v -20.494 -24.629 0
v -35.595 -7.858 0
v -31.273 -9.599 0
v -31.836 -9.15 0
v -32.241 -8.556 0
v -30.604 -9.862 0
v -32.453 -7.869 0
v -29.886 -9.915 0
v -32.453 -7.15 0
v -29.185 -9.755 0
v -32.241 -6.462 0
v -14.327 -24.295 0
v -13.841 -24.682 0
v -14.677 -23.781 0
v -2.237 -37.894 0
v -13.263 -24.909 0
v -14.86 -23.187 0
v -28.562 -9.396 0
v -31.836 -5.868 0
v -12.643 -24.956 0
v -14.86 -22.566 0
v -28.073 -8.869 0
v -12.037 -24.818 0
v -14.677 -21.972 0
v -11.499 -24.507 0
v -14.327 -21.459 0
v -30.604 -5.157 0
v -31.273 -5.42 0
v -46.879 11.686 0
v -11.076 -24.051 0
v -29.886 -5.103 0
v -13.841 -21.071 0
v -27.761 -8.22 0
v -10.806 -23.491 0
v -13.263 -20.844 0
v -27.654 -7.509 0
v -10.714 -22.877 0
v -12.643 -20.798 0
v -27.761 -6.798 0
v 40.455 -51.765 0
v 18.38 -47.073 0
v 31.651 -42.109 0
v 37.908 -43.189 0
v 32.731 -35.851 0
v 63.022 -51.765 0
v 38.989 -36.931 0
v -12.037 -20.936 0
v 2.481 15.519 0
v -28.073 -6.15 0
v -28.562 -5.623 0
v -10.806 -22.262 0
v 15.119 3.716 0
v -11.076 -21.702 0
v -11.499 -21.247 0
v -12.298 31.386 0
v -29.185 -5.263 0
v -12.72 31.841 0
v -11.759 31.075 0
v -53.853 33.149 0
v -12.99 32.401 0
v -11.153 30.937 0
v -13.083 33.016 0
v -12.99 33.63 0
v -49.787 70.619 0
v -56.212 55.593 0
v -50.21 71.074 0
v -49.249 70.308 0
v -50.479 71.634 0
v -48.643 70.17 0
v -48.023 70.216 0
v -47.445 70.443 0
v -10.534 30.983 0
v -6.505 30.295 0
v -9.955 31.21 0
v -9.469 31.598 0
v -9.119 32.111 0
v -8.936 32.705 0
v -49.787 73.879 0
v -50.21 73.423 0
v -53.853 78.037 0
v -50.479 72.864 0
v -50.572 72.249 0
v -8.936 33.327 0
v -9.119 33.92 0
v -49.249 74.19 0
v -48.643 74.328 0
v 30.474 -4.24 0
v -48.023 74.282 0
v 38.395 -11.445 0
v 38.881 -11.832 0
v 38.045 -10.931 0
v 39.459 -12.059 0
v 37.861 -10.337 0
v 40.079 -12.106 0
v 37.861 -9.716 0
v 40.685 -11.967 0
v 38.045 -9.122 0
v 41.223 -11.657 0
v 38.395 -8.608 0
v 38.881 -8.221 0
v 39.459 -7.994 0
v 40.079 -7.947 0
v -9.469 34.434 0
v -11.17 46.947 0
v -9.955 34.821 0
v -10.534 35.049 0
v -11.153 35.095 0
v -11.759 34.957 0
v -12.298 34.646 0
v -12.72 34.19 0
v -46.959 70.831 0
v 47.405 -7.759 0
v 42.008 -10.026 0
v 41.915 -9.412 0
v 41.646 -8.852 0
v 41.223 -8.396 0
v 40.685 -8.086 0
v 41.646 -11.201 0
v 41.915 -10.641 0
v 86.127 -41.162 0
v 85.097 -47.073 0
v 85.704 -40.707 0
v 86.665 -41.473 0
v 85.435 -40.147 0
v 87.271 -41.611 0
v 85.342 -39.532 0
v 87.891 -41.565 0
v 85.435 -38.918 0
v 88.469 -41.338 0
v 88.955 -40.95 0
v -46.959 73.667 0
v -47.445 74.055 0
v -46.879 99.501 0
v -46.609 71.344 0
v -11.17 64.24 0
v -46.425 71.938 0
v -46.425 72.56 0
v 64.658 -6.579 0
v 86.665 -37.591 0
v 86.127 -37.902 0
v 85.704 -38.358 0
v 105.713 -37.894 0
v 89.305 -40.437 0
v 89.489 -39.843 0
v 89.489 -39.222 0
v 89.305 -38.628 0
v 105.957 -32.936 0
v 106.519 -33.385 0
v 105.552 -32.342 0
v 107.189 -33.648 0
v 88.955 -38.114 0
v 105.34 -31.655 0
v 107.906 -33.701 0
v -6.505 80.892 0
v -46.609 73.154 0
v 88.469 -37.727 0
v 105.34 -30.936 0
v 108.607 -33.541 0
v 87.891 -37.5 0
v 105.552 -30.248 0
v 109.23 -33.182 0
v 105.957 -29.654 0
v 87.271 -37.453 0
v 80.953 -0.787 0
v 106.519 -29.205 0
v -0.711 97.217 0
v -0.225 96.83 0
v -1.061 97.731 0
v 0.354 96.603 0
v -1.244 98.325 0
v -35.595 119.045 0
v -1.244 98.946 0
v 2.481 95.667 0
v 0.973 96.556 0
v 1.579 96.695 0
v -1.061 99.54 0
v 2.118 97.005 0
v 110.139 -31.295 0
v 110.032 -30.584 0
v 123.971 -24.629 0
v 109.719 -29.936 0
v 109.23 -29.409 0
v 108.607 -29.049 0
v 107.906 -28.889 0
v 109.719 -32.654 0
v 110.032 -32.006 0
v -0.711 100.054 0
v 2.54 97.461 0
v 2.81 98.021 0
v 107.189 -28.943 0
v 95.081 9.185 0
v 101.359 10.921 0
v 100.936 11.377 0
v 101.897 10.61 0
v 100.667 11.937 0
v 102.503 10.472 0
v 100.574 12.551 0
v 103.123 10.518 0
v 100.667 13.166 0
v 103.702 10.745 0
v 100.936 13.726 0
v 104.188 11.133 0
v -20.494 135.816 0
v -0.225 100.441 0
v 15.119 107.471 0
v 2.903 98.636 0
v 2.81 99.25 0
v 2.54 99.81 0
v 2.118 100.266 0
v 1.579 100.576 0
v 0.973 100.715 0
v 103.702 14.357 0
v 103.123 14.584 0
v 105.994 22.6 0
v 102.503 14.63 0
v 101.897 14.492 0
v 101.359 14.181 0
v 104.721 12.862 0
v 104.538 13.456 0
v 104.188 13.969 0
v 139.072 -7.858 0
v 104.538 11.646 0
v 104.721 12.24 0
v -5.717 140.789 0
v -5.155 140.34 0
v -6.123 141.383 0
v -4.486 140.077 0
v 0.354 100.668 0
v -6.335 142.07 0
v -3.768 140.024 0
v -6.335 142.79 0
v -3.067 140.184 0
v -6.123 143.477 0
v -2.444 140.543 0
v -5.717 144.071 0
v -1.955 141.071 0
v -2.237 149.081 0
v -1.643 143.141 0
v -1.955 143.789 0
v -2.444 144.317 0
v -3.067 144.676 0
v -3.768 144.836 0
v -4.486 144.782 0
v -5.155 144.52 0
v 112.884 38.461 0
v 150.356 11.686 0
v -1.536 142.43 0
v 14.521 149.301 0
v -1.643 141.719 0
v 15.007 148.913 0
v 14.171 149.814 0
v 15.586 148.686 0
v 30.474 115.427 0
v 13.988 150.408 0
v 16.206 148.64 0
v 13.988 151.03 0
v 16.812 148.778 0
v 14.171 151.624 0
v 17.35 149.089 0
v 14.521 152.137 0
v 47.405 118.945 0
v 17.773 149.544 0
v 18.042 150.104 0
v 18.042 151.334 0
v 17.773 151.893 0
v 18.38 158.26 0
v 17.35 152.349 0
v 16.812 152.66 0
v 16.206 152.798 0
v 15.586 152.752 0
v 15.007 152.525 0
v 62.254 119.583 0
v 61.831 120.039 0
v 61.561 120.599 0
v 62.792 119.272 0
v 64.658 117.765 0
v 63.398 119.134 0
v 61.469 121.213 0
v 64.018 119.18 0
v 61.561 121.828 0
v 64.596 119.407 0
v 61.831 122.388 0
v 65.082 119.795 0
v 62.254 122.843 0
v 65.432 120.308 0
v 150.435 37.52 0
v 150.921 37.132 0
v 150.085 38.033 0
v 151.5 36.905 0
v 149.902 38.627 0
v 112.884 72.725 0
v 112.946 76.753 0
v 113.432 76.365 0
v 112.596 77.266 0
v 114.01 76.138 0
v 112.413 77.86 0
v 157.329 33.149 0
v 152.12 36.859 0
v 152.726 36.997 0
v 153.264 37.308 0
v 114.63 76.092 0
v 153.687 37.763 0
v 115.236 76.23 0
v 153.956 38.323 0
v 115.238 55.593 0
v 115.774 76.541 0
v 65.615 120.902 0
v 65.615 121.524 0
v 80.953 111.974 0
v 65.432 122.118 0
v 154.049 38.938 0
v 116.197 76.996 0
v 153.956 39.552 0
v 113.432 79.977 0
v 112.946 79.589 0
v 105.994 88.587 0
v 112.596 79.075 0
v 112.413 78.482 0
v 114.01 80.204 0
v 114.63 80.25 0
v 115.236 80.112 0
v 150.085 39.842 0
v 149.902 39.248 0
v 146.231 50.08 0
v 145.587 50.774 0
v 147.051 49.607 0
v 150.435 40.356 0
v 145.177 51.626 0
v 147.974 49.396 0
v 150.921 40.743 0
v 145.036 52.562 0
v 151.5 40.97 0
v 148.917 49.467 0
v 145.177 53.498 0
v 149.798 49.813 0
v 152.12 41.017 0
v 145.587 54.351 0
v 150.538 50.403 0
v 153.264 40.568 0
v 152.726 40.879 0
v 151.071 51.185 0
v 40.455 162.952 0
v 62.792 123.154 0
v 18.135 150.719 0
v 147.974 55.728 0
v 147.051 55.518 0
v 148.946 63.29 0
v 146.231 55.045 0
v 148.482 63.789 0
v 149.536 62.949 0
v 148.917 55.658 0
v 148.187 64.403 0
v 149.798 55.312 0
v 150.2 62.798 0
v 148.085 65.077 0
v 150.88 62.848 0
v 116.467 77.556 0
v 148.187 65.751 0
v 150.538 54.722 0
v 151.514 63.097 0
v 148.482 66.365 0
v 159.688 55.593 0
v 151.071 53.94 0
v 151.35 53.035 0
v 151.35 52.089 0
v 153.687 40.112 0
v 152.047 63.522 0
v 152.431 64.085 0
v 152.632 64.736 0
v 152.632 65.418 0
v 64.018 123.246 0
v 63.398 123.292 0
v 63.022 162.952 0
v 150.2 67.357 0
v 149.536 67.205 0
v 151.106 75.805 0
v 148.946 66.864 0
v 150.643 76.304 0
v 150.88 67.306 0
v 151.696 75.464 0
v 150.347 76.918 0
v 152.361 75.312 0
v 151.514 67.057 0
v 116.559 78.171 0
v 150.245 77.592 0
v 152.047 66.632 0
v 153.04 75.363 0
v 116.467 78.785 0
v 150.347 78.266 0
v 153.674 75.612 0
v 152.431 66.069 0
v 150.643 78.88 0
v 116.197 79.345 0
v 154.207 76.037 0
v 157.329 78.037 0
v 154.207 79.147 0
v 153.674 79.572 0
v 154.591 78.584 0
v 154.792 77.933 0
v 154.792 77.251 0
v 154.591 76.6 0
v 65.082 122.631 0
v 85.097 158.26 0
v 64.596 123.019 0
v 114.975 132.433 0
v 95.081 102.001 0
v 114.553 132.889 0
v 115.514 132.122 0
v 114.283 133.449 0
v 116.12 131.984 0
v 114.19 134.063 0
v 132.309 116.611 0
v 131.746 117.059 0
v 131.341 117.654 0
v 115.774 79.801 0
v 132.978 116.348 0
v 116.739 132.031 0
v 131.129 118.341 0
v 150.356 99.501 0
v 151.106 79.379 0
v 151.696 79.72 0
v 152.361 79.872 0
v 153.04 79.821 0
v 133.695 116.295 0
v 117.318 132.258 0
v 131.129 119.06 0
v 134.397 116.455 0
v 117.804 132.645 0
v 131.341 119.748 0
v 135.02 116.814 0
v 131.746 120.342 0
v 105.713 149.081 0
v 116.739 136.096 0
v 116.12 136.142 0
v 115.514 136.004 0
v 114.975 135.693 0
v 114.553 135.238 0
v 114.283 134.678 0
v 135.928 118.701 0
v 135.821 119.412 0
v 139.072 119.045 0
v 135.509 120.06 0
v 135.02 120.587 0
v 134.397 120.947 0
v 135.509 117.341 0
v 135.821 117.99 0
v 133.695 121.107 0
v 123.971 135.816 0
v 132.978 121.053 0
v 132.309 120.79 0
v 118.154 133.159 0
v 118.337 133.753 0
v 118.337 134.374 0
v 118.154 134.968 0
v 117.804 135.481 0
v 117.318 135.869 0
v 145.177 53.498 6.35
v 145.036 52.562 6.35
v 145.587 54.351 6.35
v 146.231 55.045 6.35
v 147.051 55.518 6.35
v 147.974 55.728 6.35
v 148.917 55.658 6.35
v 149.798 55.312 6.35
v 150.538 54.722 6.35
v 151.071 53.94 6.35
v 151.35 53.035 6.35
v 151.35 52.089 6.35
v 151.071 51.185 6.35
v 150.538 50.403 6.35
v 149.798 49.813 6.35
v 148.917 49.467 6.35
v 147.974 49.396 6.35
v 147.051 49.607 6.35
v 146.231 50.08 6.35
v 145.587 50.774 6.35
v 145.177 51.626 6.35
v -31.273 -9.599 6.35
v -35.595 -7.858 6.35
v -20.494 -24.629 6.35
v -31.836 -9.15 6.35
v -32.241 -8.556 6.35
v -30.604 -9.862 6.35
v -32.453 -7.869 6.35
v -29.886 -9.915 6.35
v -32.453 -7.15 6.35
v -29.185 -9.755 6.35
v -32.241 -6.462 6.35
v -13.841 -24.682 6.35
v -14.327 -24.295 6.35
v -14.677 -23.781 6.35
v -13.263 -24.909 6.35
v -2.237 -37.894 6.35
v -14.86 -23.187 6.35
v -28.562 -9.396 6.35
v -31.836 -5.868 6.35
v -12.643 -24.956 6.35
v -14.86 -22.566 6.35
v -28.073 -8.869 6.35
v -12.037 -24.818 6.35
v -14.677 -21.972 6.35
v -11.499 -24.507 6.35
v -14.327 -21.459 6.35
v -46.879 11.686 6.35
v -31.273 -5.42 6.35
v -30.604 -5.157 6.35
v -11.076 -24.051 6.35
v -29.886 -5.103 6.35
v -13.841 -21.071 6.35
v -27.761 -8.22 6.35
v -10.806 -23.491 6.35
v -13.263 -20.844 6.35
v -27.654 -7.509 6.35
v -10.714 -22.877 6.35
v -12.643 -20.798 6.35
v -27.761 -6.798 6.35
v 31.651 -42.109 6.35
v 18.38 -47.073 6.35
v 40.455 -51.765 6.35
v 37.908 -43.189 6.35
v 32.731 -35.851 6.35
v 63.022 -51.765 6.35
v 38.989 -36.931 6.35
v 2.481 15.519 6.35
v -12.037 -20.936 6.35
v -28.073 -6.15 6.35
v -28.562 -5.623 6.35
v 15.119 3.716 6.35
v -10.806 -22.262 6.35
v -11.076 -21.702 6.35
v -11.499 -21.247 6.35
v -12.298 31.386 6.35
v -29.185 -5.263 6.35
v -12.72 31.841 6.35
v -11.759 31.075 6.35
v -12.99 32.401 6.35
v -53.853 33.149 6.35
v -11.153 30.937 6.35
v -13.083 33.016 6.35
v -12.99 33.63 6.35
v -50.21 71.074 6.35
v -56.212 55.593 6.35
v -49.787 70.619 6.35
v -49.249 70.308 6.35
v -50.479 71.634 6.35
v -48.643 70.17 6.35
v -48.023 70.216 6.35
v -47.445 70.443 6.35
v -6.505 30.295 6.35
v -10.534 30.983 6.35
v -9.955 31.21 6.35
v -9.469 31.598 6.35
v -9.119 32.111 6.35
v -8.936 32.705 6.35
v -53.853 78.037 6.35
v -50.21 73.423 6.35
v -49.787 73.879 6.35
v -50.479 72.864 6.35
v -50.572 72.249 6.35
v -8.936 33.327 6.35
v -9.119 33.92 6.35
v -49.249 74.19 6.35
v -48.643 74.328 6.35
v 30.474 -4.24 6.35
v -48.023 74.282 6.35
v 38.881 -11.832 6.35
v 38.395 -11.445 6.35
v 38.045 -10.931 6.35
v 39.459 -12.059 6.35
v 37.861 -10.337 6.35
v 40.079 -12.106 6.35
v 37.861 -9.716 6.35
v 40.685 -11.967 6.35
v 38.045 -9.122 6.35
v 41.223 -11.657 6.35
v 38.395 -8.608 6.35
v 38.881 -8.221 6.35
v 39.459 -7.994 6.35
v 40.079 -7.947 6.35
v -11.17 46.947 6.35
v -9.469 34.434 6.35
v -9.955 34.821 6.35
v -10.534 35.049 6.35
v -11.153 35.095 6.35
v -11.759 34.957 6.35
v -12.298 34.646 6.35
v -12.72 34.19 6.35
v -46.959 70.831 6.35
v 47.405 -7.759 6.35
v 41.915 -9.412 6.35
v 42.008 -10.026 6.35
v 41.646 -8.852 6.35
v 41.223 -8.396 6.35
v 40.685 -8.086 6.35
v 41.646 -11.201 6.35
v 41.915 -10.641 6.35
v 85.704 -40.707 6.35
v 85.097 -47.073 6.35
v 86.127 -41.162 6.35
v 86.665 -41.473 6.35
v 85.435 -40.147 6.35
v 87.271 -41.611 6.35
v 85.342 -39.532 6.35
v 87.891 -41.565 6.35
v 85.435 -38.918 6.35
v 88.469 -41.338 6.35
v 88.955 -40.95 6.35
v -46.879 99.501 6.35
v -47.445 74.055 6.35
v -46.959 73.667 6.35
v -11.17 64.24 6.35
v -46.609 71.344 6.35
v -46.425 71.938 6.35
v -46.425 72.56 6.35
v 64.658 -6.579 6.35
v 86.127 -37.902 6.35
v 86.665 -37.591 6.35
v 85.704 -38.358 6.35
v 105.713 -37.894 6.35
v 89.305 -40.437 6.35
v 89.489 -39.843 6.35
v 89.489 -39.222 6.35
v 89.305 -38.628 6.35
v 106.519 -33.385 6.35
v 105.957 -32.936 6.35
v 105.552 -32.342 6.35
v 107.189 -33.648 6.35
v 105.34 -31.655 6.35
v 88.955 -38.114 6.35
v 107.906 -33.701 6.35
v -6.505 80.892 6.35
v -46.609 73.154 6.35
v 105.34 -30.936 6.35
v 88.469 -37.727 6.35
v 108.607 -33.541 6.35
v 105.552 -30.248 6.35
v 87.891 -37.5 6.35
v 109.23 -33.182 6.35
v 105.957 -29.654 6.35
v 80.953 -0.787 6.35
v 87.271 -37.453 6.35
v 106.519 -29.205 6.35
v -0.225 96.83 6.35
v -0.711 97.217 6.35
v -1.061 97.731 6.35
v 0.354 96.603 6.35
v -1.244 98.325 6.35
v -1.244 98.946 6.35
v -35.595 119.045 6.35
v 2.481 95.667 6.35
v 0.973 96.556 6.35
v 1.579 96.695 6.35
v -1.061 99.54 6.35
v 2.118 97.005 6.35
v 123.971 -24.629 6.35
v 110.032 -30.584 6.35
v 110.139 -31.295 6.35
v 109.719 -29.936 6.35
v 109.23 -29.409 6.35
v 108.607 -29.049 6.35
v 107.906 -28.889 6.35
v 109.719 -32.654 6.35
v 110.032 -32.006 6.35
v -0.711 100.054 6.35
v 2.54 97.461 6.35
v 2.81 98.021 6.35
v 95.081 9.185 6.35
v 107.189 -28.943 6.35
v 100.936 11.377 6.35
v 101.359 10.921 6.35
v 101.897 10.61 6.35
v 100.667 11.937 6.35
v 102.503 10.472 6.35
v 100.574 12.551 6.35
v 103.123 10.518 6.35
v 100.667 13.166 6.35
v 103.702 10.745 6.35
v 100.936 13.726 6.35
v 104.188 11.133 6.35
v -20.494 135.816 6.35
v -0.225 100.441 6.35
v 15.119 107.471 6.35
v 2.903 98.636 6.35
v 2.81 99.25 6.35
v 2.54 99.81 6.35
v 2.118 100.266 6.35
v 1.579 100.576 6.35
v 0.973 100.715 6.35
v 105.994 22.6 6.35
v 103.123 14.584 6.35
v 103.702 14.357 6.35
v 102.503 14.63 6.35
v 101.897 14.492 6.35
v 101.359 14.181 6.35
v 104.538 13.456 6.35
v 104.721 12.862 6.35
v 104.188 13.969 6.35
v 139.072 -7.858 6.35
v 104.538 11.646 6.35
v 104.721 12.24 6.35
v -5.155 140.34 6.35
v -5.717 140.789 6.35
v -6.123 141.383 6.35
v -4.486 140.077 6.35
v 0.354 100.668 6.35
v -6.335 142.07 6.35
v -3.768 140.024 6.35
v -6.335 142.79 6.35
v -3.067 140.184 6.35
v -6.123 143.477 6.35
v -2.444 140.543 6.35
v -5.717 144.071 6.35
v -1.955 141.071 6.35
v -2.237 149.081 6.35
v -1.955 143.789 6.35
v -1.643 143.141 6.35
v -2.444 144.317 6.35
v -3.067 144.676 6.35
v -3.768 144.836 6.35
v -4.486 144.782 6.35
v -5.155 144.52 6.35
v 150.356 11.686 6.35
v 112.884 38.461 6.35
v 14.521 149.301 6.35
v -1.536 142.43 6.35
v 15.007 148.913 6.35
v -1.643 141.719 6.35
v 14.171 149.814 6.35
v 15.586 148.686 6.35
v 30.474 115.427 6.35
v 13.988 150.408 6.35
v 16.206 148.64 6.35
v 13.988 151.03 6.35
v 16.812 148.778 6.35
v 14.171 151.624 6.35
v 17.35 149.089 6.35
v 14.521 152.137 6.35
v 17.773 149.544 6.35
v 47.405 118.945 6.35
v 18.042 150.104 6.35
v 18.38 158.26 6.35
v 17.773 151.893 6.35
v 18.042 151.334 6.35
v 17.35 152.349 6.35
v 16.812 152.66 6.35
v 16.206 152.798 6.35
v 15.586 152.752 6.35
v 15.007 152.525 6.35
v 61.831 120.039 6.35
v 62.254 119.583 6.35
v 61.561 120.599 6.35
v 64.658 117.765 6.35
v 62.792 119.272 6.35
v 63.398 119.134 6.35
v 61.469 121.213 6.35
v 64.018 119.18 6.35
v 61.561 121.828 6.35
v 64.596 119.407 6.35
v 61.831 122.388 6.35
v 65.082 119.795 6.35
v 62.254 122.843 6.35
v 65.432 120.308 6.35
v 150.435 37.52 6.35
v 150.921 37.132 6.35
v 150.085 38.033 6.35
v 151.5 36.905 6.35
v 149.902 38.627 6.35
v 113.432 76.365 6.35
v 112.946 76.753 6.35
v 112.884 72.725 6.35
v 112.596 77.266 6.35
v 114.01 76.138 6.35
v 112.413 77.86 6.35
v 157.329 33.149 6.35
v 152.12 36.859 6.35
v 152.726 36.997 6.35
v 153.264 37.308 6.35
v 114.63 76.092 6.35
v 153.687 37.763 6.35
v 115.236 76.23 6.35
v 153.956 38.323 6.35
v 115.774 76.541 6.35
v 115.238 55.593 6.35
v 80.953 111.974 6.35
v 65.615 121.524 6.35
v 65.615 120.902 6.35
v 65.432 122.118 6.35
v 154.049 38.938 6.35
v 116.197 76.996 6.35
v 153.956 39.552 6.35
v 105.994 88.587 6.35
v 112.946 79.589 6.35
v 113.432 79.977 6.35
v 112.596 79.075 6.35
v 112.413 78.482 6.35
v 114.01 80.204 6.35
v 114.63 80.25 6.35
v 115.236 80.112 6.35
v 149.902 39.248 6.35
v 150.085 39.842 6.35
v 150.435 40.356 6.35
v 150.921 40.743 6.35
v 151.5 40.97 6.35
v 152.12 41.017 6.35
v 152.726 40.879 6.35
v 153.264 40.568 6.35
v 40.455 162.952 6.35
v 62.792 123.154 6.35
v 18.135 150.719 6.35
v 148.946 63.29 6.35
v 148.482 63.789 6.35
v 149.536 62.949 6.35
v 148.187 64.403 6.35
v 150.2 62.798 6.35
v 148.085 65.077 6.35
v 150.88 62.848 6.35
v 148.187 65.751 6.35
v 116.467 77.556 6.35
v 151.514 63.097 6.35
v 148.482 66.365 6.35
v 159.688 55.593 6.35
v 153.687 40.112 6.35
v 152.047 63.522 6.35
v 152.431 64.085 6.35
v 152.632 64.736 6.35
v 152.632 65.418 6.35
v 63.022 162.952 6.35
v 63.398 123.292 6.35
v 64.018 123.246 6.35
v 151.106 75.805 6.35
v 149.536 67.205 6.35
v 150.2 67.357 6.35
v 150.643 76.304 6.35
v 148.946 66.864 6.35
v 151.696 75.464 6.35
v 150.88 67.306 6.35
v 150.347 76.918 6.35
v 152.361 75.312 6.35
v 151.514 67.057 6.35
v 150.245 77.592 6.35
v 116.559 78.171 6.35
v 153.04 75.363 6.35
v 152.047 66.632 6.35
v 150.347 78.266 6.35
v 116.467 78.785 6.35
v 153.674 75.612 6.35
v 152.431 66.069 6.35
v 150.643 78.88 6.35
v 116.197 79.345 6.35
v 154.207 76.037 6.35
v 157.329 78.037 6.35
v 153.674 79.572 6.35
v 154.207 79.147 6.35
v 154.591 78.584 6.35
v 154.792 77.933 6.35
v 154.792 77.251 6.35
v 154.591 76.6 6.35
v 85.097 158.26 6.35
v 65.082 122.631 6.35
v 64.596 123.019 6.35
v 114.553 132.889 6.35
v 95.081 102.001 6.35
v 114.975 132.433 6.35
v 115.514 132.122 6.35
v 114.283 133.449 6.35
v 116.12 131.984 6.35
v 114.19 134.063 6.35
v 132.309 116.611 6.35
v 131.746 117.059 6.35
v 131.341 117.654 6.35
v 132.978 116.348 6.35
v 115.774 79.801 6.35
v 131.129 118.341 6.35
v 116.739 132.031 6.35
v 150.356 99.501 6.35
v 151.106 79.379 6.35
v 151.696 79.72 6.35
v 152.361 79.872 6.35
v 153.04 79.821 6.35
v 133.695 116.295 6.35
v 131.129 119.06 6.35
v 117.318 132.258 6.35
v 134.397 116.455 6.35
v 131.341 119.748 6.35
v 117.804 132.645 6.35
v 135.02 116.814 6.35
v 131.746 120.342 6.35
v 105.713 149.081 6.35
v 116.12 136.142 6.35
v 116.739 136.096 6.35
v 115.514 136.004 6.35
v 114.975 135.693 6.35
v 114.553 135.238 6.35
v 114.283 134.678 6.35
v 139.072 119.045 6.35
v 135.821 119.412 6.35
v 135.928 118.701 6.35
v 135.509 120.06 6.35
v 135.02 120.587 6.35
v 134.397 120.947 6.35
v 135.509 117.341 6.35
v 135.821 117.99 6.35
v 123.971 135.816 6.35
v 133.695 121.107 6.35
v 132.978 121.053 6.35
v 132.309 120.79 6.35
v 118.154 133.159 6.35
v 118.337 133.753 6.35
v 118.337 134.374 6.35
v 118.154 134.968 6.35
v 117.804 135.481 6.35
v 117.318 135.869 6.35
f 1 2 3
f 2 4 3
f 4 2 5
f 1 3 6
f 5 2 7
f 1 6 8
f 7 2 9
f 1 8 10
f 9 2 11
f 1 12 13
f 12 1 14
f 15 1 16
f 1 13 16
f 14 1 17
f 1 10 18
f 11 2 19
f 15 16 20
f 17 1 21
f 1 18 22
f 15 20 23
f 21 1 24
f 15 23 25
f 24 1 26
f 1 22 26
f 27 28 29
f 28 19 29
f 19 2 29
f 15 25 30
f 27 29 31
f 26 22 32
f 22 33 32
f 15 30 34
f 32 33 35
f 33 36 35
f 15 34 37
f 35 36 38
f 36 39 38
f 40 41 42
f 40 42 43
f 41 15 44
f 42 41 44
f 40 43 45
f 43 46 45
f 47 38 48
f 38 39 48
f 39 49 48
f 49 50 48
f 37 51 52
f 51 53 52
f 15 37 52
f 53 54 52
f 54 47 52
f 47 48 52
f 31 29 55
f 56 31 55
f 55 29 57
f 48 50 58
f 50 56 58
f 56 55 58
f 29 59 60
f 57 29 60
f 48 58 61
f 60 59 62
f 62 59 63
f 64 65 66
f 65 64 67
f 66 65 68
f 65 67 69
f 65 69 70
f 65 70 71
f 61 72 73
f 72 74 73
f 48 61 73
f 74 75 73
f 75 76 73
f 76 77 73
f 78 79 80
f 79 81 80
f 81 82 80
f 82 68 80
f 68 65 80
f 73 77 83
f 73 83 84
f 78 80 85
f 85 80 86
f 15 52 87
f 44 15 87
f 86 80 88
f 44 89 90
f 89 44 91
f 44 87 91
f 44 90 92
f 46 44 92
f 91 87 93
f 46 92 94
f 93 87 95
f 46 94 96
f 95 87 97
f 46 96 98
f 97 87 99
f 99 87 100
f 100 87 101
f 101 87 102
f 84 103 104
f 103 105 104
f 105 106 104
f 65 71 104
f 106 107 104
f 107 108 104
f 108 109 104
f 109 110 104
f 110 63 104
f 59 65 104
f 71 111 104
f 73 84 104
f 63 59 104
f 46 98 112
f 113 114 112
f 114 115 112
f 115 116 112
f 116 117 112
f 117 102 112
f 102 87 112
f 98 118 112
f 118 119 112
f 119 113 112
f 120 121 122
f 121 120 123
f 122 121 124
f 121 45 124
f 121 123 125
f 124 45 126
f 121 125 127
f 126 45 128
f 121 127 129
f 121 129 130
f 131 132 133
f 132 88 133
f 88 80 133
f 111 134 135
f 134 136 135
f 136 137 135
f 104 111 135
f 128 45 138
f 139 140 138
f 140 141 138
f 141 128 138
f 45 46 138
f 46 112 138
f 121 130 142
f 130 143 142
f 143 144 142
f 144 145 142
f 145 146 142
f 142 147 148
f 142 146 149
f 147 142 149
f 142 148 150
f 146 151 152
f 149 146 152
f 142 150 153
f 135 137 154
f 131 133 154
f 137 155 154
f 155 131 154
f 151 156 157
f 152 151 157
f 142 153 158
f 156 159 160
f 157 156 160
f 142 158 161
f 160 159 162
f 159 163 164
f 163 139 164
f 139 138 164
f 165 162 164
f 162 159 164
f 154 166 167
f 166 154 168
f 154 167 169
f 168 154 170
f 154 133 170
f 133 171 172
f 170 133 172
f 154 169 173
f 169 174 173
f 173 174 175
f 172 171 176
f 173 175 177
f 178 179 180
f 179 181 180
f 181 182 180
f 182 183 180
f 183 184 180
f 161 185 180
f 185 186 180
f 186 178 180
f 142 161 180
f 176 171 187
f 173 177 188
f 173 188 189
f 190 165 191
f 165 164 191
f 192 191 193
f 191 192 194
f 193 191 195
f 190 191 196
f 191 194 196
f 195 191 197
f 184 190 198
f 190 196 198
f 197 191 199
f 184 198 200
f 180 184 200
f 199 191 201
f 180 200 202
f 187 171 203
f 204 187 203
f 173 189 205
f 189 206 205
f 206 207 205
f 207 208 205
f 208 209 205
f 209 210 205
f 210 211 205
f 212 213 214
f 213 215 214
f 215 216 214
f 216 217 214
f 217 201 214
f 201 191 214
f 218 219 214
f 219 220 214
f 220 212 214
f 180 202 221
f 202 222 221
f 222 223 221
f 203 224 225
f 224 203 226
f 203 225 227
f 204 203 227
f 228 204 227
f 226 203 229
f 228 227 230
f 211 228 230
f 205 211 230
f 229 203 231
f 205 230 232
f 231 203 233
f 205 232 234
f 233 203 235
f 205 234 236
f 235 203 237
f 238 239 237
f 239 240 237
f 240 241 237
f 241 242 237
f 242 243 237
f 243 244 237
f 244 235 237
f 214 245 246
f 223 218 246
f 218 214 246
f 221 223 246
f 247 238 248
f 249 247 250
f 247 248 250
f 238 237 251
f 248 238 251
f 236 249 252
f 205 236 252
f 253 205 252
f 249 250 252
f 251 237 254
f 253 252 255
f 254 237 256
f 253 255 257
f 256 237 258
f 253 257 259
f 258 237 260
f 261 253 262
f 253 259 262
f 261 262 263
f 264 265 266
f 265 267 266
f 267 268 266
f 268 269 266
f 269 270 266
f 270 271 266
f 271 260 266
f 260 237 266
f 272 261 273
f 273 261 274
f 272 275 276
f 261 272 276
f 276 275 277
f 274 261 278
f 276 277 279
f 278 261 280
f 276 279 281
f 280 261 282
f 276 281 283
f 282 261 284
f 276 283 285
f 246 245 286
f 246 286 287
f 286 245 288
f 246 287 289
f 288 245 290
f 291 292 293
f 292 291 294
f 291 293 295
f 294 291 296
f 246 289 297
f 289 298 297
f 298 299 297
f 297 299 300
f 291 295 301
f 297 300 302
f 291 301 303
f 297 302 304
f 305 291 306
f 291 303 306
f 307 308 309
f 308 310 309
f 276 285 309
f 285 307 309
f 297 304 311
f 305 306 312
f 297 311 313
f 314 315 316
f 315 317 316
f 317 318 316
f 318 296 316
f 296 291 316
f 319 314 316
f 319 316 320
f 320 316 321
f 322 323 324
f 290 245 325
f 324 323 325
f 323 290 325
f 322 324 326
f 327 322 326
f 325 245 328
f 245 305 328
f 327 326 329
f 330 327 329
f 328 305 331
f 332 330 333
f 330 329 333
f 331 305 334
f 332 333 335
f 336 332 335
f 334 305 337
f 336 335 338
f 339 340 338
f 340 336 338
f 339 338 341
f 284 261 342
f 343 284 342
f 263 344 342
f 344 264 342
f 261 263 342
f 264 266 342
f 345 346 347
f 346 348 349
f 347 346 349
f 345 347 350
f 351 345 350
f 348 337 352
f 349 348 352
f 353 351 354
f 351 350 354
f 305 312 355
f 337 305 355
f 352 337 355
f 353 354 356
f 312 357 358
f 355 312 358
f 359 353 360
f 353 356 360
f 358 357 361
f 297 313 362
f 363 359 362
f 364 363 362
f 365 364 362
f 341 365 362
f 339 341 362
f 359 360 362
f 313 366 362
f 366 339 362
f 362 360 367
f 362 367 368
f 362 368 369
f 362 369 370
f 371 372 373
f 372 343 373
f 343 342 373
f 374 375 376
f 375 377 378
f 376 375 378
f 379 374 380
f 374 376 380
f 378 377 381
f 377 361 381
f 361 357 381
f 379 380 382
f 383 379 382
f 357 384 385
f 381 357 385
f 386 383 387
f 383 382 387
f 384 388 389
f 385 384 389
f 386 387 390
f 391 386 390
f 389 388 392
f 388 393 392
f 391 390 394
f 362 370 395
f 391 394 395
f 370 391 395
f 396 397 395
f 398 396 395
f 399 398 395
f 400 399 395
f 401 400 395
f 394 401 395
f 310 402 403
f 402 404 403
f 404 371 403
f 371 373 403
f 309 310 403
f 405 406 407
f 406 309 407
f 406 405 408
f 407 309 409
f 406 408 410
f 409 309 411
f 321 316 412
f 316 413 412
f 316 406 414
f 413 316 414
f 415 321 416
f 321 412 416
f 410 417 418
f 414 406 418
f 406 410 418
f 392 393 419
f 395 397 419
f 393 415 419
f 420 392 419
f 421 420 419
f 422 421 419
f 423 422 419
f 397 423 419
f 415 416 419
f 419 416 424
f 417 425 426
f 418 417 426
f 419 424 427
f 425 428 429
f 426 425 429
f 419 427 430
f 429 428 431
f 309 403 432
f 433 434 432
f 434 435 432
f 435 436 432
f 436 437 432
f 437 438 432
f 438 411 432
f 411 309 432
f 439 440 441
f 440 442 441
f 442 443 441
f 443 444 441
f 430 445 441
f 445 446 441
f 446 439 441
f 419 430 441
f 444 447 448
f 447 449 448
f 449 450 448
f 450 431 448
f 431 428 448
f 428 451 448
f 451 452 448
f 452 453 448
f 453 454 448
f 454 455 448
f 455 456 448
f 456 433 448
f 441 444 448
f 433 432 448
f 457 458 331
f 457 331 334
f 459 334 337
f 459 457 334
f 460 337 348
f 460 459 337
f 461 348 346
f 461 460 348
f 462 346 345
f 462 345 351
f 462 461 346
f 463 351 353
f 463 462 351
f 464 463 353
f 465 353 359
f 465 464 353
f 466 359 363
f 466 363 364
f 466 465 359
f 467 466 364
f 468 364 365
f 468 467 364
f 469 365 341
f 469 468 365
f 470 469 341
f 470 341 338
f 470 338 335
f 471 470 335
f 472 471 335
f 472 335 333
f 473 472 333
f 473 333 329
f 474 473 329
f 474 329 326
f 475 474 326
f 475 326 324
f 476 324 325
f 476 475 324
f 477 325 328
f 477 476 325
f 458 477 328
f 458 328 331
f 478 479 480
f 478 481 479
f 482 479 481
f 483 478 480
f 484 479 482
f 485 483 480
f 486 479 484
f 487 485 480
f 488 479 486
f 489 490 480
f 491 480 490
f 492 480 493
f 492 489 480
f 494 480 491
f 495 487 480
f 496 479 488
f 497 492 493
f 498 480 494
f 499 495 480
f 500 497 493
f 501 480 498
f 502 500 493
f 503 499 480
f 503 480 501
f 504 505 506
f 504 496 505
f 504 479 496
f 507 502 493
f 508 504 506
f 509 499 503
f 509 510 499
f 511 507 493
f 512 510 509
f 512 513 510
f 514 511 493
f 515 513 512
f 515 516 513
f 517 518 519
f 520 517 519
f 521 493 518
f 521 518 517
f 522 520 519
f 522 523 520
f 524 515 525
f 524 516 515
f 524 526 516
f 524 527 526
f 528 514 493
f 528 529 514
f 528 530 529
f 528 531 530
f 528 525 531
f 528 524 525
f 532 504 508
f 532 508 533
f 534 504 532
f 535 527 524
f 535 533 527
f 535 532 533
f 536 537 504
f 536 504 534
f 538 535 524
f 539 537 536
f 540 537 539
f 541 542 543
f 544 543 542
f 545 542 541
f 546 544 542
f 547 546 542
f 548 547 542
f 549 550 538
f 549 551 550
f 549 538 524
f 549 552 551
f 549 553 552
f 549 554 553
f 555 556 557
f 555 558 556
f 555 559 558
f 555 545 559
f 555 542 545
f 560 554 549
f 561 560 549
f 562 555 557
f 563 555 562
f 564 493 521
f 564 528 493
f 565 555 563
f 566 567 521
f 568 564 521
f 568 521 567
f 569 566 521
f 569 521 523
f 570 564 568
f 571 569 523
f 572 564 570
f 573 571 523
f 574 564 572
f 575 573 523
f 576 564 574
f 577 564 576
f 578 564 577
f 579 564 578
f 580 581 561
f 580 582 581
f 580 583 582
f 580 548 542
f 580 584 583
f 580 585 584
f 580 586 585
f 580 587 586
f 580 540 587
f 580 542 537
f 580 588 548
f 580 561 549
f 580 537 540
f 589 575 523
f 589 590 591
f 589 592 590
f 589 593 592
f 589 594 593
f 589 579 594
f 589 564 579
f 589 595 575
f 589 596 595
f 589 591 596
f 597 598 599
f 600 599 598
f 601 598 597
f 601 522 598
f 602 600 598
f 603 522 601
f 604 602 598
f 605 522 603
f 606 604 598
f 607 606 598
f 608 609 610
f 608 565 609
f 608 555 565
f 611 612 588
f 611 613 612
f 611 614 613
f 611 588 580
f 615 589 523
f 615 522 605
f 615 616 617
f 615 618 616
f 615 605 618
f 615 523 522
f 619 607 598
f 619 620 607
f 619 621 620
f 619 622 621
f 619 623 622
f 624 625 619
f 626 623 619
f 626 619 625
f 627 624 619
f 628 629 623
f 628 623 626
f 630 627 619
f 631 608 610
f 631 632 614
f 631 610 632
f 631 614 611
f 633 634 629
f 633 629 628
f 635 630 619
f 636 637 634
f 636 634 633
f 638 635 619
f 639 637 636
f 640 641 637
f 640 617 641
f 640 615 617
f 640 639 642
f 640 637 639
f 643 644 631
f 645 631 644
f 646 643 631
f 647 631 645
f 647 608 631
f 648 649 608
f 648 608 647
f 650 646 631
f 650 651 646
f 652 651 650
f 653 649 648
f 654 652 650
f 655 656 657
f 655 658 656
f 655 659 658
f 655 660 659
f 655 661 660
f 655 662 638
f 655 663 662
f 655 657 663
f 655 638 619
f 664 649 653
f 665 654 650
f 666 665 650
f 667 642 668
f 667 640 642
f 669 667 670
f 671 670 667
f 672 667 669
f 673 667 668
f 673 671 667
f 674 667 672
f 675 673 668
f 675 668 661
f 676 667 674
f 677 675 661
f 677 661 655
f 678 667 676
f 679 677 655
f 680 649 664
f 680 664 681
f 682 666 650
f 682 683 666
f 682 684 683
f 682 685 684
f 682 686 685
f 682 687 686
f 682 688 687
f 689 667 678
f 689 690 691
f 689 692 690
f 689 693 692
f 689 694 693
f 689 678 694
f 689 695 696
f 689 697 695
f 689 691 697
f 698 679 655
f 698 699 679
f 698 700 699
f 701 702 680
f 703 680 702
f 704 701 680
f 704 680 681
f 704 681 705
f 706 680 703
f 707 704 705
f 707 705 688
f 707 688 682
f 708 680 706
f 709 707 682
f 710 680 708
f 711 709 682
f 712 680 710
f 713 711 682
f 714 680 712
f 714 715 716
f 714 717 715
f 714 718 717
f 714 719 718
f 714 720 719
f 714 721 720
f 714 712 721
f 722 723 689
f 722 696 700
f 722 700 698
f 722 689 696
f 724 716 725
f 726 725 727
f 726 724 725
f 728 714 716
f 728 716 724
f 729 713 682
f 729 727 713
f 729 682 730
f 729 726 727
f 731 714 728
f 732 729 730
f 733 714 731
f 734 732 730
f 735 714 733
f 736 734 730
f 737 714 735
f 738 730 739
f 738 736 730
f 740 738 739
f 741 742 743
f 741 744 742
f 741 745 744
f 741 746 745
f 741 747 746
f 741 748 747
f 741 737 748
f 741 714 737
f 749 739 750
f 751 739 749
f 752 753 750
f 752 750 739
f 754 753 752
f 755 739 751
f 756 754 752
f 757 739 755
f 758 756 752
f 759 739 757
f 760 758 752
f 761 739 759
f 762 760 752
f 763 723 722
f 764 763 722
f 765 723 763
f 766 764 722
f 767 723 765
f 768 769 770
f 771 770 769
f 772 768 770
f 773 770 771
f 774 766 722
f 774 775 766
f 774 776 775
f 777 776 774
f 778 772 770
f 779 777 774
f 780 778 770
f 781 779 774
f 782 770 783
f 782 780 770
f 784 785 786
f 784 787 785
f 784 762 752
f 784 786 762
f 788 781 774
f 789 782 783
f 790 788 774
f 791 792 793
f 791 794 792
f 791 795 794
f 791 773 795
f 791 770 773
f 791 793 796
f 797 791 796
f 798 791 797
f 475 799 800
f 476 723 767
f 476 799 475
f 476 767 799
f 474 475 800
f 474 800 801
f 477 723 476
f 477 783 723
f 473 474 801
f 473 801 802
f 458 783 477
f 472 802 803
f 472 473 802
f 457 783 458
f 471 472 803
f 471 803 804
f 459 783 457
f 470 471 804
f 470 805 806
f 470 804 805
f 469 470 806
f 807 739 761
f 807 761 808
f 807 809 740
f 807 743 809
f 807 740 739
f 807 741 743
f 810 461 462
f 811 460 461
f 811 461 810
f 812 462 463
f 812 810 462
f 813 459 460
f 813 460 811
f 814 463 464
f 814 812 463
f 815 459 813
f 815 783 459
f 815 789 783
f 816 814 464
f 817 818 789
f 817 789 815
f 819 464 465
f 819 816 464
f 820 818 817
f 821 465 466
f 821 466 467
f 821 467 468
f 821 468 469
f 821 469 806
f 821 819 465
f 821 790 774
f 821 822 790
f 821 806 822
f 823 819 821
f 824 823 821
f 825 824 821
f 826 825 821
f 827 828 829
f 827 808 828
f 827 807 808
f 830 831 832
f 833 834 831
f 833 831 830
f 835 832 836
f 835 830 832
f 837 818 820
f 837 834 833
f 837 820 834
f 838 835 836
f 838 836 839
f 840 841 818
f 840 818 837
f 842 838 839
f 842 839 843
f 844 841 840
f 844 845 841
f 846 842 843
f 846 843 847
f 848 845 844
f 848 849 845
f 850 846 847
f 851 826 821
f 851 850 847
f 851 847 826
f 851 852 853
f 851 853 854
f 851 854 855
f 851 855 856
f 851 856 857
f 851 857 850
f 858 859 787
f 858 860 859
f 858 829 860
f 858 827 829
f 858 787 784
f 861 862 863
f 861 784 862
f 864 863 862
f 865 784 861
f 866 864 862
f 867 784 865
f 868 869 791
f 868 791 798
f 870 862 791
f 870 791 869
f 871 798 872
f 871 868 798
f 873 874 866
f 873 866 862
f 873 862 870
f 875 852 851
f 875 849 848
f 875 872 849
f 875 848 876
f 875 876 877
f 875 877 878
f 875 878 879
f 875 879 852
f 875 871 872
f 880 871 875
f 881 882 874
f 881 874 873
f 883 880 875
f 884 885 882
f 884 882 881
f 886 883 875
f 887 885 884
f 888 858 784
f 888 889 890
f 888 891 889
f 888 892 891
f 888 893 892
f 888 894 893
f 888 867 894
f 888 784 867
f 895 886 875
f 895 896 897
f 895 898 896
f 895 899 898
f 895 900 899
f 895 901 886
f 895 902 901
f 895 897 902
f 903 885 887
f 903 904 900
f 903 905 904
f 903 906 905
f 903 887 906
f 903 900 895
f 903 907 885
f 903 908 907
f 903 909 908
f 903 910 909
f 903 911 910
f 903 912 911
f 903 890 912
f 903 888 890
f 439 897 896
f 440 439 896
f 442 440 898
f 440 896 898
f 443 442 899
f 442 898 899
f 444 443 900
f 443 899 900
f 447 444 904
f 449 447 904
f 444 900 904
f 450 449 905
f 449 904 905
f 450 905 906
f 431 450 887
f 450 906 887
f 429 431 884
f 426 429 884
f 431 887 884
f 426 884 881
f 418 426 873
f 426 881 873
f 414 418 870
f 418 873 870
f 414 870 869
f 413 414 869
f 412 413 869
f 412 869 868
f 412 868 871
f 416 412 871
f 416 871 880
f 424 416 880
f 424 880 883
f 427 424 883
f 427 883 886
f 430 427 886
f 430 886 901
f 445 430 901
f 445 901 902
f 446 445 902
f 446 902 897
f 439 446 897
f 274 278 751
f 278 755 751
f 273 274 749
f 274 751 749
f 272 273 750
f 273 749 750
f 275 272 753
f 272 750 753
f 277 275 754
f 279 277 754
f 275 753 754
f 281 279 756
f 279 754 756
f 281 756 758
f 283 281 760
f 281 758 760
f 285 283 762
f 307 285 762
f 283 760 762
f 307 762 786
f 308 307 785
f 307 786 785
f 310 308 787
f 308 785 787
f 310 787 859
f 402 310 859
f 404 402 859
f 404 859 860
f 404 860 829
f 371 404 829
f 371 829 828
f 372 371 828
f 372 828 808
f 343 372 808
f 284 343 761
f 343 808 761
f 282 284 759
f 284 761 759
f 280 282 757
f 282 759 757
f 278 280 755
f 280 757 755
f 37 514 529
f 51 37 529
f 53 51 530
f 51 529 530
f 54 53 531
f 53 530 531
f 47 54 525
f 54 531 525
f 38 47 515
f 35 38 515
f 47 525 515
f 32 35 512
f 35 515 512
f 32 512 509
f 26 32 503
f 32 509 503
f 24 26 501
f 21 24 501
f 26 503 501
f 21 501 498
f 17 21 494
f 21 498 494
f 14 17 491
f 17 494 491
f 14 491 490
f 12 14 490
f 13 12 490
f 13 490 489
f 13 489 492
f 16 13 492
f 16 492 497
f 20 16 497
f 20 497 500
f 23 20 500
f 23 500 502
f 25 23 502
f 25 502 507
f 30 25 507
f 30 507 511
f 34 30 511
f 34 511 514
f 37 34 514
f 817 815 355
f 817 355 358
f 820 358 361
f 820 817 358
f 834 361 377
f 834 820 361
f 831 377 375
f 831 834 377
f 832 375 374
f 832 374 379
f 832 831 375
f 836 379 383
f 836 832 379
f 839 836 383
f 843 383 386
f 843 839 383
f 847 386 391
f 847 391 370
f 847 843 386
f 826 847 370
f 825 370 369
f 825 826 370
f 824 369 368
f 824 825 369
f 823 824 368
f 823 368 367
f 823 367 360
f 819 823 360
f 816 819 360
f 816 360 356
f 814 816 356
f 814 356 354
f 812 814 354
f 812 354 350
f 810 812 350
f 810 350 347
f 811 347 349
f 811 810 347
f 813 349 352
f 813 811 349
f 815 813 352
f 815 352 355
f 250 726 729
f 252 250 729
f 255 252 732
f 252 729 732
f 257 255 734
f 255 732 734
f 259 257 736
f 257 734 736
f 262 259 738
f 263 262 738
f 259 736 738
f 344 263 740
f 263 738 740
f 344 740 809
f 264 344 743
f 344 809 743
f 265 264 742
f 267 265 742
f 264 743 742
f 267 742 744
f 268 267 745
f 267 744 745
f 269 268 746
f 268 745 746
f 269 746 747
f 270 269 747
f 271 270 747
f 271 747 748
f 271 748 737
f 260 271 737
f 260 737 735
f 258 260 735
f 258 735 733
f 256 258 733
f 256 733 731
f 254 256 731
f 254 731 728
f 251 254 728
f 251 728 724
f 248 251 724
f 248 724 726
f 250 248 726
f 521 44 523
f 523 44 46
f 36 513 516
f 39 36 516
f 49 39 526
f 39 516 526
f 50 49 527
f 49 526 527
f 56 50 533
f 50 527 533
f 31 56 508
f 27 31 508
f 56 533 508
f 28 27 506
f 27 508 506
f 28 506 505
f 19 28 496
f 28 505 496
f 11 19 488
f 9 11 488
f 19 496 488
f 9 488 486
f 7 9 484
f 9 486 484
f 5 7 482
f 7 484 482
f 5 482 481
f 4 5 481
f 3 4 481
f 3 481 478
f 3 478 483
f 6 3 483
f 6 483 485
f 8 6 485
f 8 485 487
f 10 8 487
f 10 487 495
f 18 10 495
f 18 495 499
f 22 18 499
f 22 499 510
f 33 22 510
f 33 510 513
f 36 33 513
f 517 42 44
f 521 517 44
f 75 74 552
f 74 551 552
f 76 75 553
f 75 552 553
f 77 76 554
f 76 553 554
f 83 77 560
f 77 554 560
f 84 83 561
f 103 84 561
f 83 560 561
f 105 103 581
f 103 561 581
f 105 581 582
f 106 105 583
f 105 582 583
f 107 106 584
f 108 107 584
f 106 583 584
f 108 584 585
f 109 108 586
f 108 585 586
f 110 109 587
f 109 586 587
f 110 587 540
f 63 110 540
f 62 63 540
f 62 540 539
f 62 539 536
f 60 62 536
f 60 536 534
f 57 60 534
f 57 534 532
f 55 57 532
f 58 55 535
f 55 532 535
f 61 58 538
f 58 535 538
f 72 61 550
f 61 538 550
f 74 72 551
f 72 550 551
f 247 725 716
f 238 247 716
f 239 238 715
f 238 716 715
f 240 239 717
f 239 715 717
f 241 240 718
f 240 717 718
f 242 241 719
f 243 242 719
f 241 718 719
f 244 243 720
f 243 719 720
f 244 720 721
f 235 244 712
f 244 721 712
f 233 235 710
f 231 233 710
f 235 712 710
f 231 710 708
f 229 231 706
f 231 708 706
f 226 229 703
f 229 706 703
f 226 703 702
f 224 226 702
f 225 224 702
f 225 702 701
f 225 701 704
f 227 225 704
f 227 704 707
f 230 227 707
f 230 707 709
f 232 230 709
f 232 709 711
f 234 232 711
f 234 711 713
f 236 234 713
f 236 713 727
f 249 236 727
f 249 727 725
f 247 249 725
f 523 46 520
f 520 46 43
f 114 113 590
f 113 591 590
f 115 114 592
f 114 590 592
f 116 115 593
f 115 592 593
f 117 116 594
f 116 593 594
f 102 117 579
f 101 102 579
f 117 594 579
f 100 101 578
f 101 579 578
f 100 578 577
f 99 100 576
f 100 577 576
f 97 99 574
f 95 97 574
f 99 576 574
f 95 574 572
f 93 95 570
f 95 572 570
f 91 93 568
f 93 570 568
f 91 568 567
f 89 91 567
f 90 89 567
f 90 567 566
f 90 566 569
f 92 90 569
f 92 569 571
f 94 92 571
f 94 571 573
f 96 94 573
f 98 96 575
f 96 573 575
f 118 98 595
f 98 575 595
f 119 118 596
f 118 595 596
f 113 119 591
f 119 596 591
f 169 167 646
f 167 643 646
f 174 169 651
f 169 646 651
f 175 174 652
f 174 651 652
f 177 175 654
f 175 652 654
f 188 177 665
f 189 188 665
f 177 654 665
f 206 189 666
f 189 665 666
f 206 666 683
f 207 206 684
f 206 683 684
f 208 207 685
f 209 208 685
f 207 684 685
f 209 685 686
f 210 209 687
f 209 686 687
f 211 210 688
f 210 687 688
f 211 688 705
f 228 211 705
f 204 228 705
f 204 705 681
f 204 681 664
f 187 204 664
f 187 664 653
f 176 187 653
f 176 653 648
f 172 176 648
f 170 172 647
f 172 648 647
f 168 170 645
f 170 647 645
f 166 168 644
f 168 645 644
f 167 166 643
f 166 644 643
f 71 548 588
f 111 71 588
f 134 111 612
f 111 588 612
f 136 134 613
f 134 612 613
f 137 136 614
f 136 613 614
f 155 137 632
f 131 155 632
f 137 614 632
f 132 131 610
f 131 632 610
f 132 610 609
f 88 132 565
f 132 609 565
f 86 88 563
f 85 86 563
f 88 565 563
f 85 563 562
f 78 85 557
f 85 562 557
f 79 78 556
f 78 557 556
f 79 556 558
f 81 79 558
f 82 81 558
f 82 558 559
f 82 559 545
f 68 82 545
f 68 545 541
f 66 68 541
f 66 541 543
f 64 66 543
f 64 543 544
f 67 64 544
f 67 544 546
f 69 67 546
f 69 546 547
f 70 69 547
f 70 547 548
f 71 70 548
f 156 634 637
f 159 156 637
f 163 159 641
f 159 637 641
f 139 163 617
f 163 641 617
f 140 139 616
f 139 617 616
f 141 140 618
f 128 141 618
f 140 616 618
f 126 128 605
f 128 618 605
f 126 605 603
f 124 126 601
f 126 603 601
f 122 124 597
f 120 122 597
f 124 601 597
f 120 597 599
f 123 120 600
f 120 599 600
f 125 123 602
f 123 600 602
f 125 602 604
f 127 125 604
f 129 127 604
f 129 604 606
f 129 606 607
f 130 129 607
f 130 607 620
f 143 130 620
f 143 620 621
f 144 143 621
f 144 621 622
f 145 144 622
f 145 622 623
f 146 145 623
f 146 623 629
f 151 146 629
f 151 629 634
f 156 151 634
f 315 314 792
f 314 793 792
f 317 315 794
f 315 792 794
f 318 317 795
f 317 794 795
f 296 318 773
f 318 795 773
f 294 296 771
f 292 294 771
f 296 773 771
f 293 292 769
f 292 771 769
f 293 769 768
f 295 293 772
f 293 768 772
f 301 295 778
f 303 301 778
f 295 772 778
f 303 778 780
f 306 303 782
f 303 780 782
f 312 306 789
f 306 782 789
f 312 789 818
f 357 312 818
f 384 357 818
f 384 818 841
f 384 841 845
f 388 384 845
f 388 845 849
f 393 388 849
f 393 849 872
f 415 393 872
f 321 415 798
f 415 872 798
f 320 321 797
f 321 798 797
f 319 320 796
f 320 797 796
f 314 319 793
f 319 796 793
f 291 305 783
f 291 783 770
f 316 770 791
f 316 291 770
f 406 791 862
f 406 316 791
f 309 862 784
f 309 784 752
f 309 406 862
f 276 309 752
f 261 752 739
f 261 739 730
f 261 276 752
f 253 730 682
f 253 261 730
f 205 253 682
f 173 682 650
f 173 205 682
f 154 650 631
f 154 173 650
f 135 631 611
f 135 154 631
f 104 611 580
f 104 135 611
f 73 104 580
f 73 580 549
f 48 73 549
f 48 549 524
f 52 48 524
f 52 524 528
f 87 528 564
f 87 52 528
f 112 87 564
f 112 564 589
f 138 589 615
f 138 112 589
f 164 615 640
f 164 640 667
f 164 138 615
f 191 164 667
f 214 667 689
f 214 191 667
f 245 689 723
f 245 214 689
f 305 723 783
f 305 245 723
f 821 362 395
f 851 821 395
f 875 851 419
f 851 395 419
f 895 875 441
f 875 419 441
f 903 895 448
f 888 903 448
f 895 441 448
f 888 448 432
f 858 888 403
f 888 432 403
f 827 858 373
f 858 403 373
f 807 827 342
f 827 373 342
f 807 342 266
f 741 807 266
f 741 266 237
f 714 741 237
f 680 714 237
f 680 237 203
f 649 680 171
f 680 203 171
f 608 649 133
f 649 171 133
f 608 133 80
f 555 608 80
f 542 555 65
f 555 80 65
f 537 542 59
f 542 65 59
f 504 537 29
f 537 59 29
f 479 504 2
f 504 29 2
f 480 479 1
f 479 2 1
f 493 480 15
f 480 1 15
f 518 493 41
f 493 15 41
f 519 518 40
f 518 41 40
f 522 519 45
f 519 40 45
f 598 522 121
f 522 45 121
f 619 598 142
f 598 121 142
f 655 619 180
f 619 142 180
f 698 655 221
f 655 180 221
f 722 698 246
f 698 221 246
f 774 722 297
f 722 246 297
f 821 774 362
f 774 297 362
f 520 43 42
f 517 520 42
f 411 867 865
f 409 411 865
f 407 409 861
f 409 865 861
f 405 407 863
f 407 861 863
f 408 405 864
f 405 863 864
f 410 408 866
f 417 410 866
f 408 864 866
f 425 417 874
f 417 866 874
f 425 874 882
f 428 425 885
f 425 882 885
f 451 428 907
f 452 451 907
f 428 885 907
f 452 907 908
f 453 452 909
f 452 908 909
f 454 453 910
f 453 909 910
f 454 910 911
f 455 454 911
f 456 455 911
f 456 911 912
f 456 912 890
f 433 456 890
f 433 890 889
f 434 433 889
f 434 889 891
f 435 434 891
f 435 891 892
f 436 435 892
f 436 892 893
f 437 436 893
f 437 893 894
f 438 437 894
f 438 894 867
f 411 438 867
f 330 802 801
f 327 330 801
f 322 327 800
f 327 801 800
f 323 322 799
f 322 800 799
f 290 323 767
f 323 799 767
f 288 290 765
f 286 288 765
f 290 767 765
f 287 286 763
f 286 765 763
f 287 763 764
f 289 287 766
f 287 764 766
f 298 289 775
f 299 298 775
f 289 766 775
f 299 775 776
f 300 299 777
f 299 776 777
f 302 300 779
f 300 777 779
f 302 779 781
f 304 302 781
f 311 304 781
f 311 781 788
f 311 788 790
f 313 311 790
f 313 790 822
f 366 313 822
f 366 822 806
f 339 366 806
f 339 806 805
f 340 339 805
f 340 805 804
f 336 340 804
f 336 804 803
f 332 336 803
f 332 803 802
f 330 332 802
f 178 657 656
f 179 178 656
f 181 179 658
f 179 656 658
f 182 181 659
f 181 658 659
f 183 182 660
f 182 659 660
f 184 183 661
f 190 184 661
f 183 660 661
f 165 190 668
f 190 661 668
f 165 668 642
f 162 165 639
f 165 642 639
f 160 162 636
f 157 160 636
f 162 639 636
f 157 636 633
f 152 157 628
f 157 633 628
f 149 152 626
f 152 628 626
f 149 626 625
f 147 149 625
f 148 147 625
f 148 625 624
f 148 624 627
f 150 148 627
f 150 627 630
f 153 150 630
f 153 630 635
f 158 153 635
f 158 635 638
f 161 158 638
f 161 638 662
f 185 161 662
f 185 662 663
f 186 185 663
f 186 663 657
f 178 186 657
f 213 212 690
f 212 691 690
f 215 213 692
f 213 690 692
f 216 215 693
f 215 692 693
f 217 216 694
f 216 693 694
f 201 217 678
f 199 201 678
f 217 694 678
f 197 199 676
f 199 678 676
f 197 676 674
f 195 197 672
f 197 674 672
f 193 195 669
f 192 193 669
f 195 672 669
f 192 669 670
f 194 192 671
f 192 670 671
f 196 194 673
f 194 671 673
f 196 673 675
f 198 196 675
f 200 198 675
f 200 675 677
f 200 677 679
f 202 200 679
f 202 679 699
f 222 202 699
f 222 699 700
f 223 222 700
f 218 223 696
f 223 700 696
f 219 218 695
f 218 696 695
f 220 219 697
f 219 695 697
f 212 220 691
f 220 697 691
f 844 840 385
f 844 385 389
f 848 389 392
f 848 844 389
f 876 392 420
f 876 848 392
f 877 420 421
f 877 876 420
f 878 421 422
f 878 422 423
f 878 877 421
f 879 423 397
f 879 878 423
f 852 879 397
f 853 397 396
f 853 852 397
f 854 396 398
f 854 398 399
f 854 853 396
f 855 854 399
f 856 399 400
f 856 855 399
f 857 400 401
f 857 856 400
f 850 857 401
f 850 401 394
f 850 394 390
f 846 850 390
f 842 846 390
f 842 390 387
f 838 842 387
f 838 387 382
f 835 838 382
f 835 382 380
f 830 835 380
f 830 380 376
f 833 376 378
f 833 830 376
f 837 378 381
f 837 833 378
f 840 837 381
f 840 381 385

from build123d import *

# Parameters (mm, degrees)
SKETCH1_R                 = 107.95
SKETCH1_R_2               = 63.5
BOSS_EXTRUDE1_DEPTH       = 6.35
SKETCH3_R                 = 2.085
CUT_EXTRUDE2_DEPTH        = 229.663768434
CIRPATTERN1_COUNT         = 6
SKETCH4_R                 = 2.085
CUT_EXTRUDE3_DEPTH        = 229.663768434
CIRPATTERN2_COUNT         = 6
SKETCH5_R                 = 2.413
CUT_EXTRUDE4_DEPTH        = 229.663768434
CUT_EXTRUDE7_DEPTH        = 229.663768434
CUT_EXTRUDE7_DEPTH_BACK   = 229.663768434
SKETCH9_R                 = 2.413
CUT_EXTRUDE8_DEPTH        = 229.663768434
CUT_EXTRUDE10_START       = -6.35
CUT_EXTRUDE10_OUTLINE_R   = 3.175
CUT_EXTRUDE10_OUTLINE_R_2 = 2.286
CUT_EXTRUDE10_DEPTH       = 6.35


# Read off the part's stored shape, not the designer's step: Cut-Extrude10
with BuildPart() as part:
    # Sketch1 → Boss-Extrude1 (new body)
    with BuildSketch(Plane.XY):
        with Locations((51.738381467, 55.593319394)):
            Circle(SKETCH1_R)
        with Locations((51.738381467, 55.593319394)):
            Circle(SKETCH1_R_2, mode=Mode.SUBTRACT)
    extrude(amount=BOSS_EXTRUDE1_DEPTH)

    # Sketch3 → Cut-Extrude2 (cut, through all)
    with BuildSketch(Plane.XY.offset(6.35)):
        with Locations((-12.798570104, -22.876686862)):
            Circle(SKETCH3_R)
    cut_extrude2 = extrude(amount=-CUT_EXTRUDE2_DEPTH, mode=Mode.SUBTRACT)

    # CirPattern1: Cut-Extrude2 ×6 about axis
    cirpattern1_axis = Axis((51.738381467, 55.593319394, 0), (0, 0, 1))
    for i in range(1, CIRPATTERN1_COUNT):
        add(cut_extrude2.rotate(cirpattern1_axis, i * 360 / CIRPATTERN1_COUNT), mode=Mode.SUBTRACT)

    # Sketch4 → Cut-Extrude3 (cut, symmetric)
    with BuildSketch(Plane.XY.offset(6.35)):
        with Locations((39.923069121, -10.026449115)):
            Circle(SKETCH4_R)
    cut_extrude3 = extrude(amount=CUT_EXTRUDE3_DEPTH, both=True, mode=Mode.SUBTRACT)

    # CirPattern2: Cut-Extrude3 ×6 about axis
    cirpattern2_axis = Axis((51.738381467, 55.593319394, 0), (0, 0, 1))
    for i in range(1, CIRPATTERN2_COUNT):
        add(cut_extrude3.rotate(cirpattern2_axis, i * 360 / CIRPATTERN2_COUNT), mode=Mode.SUBTRACT)

    # Sketch5 → Cut-Extrude4 (cut, through all)
    with BuildSketch(Plane.XY.offset(6.35)):
        with Locations((-30.066706461, -7.50922857)):
            Circle(SKETCH5_R)
        with Locations((107.725712792, -31.295181319)):
            Circle(SKETCH5_R)
    extrude(amount=-CUT_EXTRUDE4_DEPTH, mode=Mode.SUBTRACT)

    # Sketch8 → Cut-Extrude7 (cut, two sides: drawn at the far end of the back side and taken through both)
    with BuildSketch(Plane.XY.offset(6.35).offset(-CUT_EXTRUDE7_DEPTH_BACK)):
        Polygon((31.650955464, -42.108620026), (32.73112738, -35.85116618), (38.988581226, -36.931338096), (37.90840931, -43.188791942), align=None)
    extrude(amount=CUT_EXTRUDE7_DEPTH + CUT_EXTRUDE7_DEPTH_BACK, mode=Mode.SUBTRACT)

    # Sketch9 → Cut-Extrude8 (cut, through all)
    with BuildSketch(Plane.XY.offset(6.35)):
        with Locations((-3.948592074, 142.429971857)):
            Circle(SKETCH9_R)
        with Locations((133.51515401, 118.700755207)):
            Circle(SKETCH9_R)
    extrude(amount=-CUT_EXTRUDE8_DEPTH, mode=Mode.SUBTRACT)

    # Cut-Extrude10 outline → Cut-Extrude10 (cut)
    with BuildSketch(Plane(origin=(0, 0, 0), x_dir=(-1, 0, 0), z_dir=(0, 0, -1)).offset(CUT_EXTRUDE10_START)):
        with Locations((-148.210776777, 52.562256335)):
            Circle(CUT_EXTRUDE10_OUTLINE_R)
        with Locations((-152.531464441, 77.592071718)):
            Circle(CUT_EXTRUDE10_OUTLINE_R_2)
        with Locations((-150.371120609, 65.077164026)):
            Circle(CUT_EXTRUDE10_OUTLINE_R_2)
    extrude(amount=CUT_EXTRUDE10_DEPTH, mode=Mode.SUBTRACT)


solid = part.part
